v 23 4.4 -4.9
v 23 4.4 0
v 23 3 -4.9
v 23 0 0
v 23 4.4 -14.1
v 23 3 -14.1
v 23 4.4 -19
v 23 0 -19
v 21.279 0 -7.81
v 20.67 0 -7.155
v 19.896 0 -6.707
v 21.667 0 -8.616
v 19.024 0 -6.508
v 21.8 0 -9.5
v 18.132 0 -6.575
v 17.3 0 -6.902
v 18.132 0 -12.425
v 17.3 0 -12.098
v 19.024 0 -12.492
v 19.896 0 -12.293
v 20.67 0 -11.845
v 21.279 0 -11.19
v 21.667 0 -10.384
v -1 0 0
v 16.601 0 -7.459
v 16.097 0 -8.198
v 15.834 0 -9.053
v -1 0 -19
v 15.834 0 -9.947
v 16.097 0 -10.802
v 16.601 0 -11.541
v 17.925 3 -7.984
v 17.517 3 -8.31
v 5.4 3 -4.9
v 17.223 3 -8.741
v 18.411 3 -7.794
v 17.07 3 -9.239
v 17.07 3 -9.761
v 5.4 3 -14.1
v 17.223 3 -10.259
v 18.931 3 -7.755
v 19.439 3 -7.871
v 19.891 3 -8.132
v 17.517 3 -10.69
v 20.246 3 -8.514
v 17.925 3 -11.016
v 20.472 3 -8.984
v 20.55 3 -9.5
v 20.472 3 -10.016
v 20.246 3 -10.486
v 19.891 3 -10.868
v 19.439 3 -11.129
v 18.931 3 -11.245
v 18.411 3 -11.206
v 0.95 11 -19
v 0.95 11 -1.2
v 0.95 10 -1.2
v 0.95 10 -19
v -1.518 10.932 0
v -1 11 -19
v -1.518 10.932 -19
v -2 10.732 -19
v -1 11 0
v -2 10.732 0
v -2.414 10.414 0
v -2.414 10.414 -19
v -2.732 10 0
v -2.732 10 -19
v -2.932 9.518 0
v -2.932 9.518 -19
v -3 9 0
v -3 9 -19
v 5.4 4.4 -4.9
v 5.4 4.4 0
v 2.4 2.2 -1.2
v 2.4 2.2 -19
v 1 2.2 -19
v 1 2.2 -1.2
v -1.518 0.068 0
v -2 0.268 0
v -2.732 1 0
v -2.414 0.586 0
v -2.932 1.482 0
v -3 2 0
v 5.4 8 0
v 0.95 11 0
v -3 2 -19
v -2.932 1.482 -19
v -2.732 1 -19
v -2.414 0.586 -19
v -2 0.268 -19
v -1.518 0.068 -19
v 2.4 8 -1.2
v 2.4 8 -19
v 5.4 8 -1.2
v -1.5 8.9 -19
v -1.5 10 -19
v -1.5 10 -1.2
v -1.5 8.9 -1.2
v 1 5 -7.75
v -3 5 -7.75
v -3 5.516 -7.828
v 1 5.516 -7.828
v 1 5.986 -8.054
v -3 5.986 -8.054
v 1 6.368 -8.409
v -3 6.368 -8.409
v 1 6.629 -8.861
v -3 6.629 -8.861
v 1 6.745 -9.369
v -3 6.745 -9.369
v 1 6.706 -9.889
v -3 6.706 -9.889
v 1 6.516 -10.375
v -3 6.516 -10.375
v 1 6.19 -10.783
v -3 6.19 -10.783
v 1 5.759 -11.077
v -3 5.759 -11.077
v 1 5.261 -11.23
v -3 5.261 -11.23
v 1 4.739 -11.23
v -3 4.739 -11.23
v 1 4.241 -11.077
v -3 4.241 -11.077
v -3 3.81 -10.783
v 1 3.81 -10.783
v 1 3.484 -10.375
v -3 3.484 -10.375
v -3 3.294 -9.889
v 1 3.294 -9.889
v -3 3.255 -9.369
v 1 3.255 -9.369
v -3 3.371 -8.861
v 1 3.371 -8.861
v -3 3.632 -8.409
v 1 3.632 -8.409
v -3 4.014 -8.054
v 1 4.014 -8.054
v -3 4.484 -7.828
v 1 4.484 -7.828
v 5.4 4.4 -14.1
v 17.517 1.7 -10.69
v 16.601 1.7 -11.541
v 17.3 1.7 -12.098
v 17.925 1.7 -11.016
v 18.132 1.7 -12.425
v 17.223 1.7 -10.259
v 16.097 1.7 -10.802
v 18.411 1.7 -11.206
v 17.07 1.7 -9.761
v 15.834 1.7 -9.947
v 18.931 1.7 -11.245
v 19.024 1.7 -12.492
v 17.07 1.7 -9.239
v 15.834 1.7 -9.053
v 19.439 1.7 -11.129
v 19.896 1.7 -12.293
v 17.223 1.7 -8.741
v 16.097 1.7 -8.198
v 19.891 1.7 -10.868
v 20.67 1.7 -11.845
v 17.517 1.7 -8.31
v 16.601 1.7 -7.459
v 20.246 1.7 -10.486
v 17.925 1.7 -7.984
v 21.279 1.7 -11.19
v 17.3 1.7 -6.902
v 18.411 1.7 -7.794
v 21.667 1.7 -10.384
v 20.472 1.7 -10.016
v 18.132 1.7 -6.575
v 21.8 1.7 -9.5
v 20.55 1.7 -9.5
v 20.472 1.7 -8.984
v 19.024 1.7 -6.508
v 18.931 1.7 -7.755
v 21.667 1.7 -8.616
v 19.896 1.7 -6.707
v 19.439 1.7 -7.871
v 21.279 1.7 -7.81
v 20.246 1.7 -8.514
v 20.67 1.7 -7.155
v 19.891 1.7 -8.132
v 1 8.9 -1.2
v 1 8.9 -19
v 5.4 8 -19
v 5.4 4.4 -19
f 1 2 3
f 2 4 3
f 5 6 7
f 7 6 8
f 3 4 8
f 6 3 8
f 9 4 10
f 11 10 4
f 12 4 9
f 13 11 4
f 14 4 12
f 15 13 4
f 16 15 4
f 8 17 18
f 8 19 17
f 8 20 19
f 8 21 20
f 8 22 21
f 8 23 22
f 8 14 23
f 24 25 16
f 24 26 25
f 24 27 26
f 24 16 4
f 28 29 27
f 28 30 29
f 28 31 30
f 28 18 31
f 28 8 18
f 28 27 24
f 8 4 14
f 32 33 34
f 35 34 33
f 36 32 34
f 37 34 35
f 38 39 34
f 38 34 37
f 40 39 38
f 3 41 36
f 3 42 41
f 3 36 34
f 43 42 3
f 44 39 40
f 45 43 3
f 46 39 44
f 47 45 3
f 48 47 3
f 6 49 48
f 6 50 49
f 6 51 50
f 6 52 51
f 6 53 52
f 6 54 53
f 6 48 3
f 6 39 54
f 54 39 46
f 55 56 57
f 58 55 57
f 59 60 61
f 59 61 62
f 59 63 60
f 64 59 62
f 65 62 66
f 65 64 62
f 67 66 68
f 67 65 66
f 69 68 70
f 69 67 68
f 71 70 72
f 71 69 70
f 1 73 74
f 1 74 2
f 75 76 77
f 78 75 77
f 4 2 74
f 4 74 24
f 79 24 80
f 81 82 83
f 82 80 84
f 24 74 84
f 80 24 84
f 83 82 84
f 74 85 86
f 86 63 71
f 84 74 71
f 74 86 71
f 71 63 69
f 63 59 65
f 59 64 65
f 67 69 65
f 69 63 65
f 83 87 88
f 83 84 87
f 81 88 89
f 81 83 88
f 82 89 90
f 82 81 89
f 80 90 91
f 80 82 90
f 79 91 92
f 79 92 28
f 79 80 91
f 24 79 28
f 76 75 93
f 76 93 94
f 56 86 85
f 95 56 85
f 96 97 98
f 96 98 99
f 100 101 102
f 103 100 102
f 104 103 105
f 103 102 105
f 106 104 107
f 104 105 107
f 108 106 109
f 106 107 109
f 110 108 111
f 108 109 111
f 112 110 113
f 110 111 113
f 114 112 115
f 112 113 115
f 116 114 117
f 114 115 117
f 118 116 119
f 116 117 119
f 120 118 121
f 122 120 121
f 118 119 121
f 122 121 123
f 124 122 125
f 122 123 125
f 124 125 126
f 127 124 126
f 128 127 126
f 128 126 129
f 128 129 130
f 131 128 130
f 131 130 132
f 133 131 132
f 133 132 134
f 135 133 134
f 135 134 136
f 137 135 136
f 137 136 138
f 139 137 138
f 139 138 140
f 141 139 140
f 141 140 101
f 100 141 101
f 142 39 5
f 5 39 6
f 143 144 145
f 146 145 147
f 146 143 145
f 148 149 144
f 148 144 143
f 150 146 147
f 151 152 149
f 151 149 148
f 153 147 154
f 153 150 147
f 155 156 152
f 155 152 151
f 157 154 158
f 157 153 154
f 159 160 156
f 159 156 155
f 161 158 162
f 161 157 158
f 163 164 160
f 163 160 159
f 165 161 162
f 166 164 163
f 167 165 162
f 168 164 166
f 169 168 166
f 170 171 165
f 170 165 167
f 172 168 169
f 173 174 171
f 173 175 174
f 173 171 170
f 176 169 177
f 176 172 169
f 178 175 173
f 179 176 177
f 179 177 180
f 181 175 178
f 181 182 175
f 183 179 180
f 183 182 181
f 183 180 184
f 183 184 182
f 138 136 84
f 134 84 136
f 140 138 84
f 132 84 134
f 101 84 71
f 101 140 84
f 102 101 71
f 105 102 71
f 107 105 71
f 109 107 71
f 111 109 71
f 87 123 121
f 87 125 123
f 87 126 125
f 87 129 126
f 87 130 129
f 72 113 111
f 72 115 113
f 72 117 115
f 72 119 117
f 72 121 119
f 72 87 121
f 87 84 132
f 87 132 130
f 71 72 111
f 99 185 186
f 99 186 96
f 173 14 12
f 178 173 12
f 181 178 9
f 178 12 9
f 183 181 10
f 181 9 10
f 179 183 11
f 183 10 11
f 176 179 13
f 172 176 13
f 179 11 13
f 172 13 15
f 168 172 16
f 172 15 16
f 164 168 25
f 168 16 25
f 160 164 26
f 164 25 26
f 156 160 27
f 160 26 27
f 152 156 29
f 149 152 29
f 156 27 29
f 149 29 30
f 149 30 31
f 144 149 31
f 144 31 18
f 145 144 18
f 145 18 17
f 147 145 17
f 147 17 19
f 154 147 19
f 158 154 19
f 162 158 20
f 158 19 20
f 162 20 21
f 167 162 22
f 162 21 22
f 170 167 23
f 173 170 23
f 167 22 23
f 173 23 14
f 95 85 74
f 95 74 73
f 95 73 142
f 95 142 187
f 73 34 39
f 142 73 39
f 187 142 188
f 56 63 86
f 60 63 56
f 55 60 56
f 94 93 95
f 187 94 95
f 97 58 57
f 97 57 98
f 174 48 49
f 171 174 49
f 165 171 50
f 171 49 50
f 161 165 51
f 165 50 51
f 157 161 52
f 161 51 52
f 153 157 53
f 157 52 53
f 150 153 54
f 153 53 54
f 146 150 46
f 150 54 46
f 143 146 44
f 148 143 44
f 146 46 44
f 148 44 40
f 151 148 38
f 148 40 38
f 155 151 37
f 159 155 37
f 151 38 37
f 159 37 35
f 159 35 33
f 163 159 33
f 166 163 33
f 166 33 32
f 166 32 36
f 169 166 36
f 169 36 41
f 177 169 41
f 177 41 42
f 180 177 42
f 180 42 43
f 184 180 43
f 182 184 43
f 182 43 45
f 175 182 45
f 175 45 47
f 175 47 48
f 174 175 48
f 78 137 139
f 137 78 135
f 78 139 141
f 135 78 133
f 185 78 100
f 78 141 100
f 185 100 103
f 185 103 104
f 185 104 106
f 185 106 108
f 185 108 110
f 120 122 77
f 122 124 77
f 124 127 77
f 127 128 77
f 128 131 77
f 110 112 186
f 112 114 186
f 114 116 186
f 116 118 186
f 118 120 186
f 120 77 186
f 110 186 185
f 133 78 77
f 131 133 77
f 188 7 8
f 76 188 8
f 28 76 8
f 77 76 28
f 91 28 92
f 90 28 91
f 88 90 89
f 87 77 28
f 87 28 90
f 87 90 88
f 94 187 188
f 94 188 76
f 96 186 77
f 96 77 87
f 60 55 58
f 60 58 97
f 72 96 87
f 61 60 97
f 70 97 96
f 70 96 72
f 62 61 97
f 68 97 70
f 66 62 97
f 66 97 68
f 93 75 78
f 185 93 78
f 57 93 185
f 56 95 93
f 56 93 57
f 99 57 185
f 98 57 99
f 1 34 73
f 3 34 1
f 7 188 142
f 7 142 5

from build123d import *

# Parameters (mm, degrees)
SKETCH2_W           = 23
SKETCH2_H           = 19
BOSS_EXTRUDE1_DEPTH = 3
SKETCH3_W           = 1
SKETCH3_H           = 19
SKETCH3_W_2         = 3
BOSS_EXTRUDE2_DEPTH = 5
BOSS_EXTRUDE3_DEPTH = 19
SKETCH5_R           = 1.75
CUT_EXTRUDE1_DEPTH  = 4
SKETCH6_R           = 3
CUT_EXTRUDE2_DEPTH  = 1.7
SKETCH7_W           = 17.6
SKETCH7_H           = 4.9
BOSS_EXTRUDE4_DEPTH = 1.4
SKETCH8_W           = 2.5
SKETCH8_H           = 0.9
BOSS_EXTRUDE5_DEPTH = 19
SKETCH9_W           = 1.4
SKETCH9_H           = 0.8
CUT_EXTRUDE3_DEPTH  = 20
BOSS_EXTRUDE6_DEPTH = 1.2
CUT_EXTRUDE4_REACH  = 28
SKETCH11_R          = 1.75
FILLET1_R           = 2
FILLET2_R           = 2


with BuildPart() as part:
    # Sketch2 → Boss-Extrude1 (new body)
    with BuildSketch(Plane(origin=(0, 0, 0), x_dir=(1, 0, 0), z_dir=(0, 1, 0))):
        with Locations((11.5, 9.5)):
            Rectangle(SKETCH2_W, SKETCH2_H)
    extrude(amount=BOSS_EXTRUDE1_DEPTH)

    # Sketch3 → Boss-Extrude2 (add)
    with BuildSketch(Plane(origin=(0, 3, 0), x_dir=(1, 0, 0), z_dir=(0, 1, 0))):
        with Locations((0.5, 9.5)):
            Rectangle(SKETCH3_W, SKETCH3_H)
        with Locations((3.9, 9.5)):
            Rectangle(SKETCH3_W_2, SKETCH3_H)
    extrude(amount=BOSS_EXTRUDE2_DEPTH)

    # Sketch4 → Boss-Extrude3 (add)
    with BuildSketch(Plane(origin=(0, 0, -19), x_dir=(-1, 0, 0), z_dir=(0, 0, -1))):
        Polygon((0, 0), (3, 0), (3, 8), (3, 11), (-0.95, 11), (-0.95, 10), (1.5, 10), (1.5, 8), (0, 8), align=None)
    extrude(amount=-BOSS_EXTRUDE3_DEPTH)

    # Sketch5 → Cut-Extrude1 (cut, through all)
    with BuildSketch(Plane(origin=(0, 3, 0), x_dir=(1, 0, 0), z_dir=(0, 1, 0))):
        with Locations((18.8, 9.5)):
            Circle(SKETCH5_R)
    extrude(amount=-CUT_EXTRUDE1_DEPTH, mode=Mode.SUBTRACT)

    # Sketch6 → Cut-Extrude2 (cut)
    with BuildSketch(Plane.XZ):
        with Locations((18.8, -9.5)):
            Circle(SKETCH6_R)
    extrude(amount=-CUT_EXTRUDE2_DEPTH, mode=Mode.SUBTRACT)

    # Sketch7 → Boss-Extrude4 (add)
    with BuildSketch(Plane(origin=(0, 3, 0), x_dir=(1, 0, 0), z_dir=(0, 1, 0))):
        with Locations((14.2, 2.45)):
            Rectangle(SKETCH7_W, SKETCH7_H)
        with Locations((14.2, 16.55)):
            Rectangle(SKETCH7_W, SKETCH7_H)
    extrude(amount=BOSS_EXTRUDE4_DEPTH)

    # Sketch8 → Boss-Extrude5 (add)
    with BuildSketch(Plane(origin=(0, 0, -19), x_dir=(-1, 0, 0), z_dir=(0, 0, -1))):
        with Locations((0.25, 8.45)):
            Rectangle(SKETCH8_W, SKETCH8_H)
    extrude(amount=-BOSS_EXTRUDE5_DEPTH)

    # Sketch9 → Cut-Extrude3 (cut, through all)
    with BuildSketch(Plane(origin=(0, 0, -19), x_dir=(-1, 0, 0), z_dir=(0, 0, -1))):
        with Locations((-1.7, 2.6)):
            Rectangle(SKETCH9_W, SKETCH9_H)
    extrude(amount=-CUT_EXTRUDE3_DEPTH, mode=Mode.SUBTRACT)

    # Sketch10 → Boss-Extrude6 (add)
    with BuildSketch(Plane.XY):
        Polygon((-1.5, 8.9), (-1.5, 10), (0.95, 10), (0.95, 11), (5.4, 8), (2.4, 8), (2.4, 2.2), (1, 2.2), (1, 8.9), align=None)
    extrude(amount=-BOSS_EXTRUDE6_DEPTH)

    # Sketch11 → Cut-Extrude4 (cut, up to next)
    with BuildSketch(Plane.ZY.offset(3), mode=Mode.PRIVATE) as cut_extrude4_sk1:
        with Locations((-9.5, 5)):
            Circle(SKETCH11_R)
    cut_extrude4_tool1 = extrude(cut_extrude4_sk1.sketch, amount=-CUT_EXTRUDE4_REACH, mode=Mode.PRIVATE) & part.part
    add(cut_extrude4_tool1.solids().sort_by_distance((-3, 5, -9.5))[0], mode=Mode.SUBTRACT)

    # Fillet1
    fillet1_edges = [part.edges().sort_by_distance(p)[0] for p in [
        (-3, 11, -9.5),
    ]]
    fillet(fillet1_edges, radius=FILLET1_R)

    # Fillet2
    fillet2_edges = [part.edges().sort_by_distance(p)[0] for p in [
        (-3, 0, -9.5),
    ]]
    fillet(fillet2_edges, radius=FILLET2_R)


solid = part.part
